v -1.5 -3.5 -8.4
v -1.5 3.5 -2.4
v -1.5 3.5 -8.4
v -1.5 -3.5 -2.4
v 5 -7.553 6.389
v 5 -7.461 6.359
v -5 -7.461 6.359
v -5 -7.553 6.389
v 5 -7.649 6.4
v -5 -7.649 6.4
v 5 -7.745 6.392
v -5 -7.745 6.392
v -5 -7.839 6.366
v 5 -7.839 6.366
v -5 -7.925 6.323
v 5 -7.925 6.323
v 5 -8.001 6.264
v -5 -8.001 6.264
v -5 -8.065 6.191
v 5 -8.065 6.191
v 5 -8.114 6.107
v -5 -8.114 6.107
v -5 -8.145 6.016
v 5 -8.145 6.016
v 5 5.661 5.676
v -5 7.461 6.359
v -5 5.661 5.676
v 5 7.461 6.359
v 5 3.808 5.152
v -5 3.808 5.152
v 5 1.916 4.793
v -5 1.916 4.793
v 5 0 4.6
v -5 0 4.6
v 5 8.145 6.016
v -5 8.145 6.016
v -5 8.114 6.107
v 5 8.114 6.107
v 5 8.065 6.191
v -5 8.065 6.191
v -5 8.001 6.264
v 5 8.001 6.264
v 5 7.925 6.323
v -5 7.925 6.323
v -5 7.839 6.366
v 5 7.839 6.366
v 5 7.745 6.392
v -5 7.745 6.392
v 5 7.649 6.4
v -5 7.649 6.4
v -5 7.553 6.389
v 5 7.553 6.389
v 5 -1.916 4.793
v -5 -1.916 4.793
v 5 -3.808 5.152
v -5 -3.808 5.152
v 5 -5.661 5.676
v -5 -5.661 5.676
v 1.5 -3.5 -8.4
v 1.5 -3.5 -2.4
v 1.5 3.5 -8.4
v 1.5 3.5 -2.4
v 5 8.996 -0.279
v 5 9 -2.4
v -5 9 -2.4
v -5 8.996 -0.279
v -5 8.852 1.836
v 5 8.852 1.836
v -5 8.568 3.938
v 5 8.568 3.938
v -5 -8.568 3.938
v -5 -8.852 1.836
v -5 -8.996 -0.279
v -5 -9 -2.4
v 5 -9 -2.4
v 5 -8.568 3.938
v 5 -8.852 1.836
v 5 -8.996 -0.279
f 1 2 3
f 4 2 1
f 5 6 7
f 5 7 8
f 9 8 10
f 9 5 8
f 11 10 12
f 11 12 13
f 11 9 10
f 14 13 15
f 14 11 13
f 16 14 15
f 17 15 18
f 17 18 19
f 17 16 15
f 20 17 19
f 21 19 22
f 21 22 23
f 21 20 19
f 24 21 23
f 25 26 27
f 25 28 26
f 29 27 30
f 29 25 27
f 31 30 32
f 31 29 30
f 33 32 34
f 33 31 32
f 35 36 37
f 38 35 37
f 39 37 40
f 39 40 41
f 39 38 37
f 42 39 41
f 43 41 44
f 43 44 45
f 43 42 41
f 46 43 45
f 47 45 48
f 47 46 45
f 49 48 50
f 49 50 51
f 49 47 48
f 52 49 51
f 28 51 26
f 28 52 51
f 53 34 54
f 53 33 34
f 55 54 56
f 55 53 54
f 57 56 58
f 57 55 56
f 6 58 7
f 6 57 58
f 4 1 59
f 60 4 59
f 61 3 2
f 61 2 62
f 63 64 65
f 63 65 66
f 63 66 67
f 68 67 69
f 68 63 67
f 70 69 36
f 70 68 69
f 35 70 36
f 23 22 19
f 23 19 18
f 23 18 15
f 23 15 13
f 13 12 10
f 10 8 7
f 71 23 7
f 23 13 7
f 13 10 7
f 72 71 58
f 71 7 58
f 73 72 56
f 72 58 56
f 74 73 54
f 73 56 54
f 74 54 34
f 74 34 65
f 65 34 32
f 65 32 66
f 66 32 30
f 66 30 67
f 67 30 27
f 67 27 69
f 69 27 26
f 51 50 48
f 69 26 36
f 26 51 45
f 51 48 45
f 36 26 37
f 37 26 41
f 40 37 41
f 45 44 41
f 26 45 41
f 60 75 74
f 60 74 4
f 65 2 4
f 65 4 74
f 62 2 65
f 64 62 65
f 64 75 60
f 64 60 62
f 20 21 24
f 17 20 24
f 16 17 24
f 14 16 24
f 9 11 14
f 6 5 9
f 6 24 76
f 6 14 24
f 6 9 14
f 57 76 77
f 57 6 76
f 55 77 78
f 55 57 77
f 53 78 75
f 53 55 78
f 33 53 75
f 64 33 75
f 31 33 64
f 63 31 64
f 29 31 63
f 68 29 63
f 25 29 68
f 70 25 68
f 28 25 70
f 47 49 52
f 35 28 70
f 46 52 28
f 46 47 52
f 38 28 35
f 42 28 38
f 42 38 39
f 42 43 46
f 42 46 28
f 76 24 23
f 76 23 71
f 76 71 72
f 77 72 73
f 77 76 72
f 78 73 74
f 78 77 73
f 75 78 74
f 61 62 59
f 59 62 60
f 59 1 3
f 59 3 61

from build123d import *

# Parameters (mm, degrees)
F1_DEPTH = 5
F2_W     = 3
F2_H     = 7
F3_DEPTH = 6


with BuildPart() as f1:
    # F0 (on Right) → F1 (new body, symmetric)
    with BuildSketch(Plane.YZ):
        with BuildLine():
            ThreePointArc((0, 4.6000001004), (-3.8076052812, 5.1521296368), (-7.460796192, 6.3591512489))
            ThreePointArc((-7.460796192, 6.3591512489), (-7.8828526102, 6.3468033059), (-8.1449647452, 6.0157726117))
            ThreePointArc((-8.1449647452, 6.0157726117), (-8.8517929002, 1.8362640656), (-9, -2.3999998996))
            Line((-9, -2.3999998996), (0, -2.3999998996))
            Line((0, -2.3999998996), (9, -2.3999998996))
            ThreePointArc((9, -2.3999998996), (8.8517929002, 1.8362640656), (8.1449647452, 6.0157726117))
            ThreePointArc((8.1449647452, 6.0157726117), (7.8828526102, 6.3468033059), (7.460796192, 6.3591512489))
            ThreePointArc((7.460796192, 6.3591512489), (3.8076052812, 5.1521296368), (0, 4.6000001004))
        make_face()
    extrude(amount=F1_DEPTH, both=True)

    # F2 (on face) → F3 (join)
    with BuildSketch(Plane(origin=(0, 0, -2.3999998996), x_dir=(1, 0, 0), z_dir=(0, 0, -1))):
        Rectangle(F2_W, F2_H)
    extrude(amount=F3_DEPTH)


solid = f1.part
